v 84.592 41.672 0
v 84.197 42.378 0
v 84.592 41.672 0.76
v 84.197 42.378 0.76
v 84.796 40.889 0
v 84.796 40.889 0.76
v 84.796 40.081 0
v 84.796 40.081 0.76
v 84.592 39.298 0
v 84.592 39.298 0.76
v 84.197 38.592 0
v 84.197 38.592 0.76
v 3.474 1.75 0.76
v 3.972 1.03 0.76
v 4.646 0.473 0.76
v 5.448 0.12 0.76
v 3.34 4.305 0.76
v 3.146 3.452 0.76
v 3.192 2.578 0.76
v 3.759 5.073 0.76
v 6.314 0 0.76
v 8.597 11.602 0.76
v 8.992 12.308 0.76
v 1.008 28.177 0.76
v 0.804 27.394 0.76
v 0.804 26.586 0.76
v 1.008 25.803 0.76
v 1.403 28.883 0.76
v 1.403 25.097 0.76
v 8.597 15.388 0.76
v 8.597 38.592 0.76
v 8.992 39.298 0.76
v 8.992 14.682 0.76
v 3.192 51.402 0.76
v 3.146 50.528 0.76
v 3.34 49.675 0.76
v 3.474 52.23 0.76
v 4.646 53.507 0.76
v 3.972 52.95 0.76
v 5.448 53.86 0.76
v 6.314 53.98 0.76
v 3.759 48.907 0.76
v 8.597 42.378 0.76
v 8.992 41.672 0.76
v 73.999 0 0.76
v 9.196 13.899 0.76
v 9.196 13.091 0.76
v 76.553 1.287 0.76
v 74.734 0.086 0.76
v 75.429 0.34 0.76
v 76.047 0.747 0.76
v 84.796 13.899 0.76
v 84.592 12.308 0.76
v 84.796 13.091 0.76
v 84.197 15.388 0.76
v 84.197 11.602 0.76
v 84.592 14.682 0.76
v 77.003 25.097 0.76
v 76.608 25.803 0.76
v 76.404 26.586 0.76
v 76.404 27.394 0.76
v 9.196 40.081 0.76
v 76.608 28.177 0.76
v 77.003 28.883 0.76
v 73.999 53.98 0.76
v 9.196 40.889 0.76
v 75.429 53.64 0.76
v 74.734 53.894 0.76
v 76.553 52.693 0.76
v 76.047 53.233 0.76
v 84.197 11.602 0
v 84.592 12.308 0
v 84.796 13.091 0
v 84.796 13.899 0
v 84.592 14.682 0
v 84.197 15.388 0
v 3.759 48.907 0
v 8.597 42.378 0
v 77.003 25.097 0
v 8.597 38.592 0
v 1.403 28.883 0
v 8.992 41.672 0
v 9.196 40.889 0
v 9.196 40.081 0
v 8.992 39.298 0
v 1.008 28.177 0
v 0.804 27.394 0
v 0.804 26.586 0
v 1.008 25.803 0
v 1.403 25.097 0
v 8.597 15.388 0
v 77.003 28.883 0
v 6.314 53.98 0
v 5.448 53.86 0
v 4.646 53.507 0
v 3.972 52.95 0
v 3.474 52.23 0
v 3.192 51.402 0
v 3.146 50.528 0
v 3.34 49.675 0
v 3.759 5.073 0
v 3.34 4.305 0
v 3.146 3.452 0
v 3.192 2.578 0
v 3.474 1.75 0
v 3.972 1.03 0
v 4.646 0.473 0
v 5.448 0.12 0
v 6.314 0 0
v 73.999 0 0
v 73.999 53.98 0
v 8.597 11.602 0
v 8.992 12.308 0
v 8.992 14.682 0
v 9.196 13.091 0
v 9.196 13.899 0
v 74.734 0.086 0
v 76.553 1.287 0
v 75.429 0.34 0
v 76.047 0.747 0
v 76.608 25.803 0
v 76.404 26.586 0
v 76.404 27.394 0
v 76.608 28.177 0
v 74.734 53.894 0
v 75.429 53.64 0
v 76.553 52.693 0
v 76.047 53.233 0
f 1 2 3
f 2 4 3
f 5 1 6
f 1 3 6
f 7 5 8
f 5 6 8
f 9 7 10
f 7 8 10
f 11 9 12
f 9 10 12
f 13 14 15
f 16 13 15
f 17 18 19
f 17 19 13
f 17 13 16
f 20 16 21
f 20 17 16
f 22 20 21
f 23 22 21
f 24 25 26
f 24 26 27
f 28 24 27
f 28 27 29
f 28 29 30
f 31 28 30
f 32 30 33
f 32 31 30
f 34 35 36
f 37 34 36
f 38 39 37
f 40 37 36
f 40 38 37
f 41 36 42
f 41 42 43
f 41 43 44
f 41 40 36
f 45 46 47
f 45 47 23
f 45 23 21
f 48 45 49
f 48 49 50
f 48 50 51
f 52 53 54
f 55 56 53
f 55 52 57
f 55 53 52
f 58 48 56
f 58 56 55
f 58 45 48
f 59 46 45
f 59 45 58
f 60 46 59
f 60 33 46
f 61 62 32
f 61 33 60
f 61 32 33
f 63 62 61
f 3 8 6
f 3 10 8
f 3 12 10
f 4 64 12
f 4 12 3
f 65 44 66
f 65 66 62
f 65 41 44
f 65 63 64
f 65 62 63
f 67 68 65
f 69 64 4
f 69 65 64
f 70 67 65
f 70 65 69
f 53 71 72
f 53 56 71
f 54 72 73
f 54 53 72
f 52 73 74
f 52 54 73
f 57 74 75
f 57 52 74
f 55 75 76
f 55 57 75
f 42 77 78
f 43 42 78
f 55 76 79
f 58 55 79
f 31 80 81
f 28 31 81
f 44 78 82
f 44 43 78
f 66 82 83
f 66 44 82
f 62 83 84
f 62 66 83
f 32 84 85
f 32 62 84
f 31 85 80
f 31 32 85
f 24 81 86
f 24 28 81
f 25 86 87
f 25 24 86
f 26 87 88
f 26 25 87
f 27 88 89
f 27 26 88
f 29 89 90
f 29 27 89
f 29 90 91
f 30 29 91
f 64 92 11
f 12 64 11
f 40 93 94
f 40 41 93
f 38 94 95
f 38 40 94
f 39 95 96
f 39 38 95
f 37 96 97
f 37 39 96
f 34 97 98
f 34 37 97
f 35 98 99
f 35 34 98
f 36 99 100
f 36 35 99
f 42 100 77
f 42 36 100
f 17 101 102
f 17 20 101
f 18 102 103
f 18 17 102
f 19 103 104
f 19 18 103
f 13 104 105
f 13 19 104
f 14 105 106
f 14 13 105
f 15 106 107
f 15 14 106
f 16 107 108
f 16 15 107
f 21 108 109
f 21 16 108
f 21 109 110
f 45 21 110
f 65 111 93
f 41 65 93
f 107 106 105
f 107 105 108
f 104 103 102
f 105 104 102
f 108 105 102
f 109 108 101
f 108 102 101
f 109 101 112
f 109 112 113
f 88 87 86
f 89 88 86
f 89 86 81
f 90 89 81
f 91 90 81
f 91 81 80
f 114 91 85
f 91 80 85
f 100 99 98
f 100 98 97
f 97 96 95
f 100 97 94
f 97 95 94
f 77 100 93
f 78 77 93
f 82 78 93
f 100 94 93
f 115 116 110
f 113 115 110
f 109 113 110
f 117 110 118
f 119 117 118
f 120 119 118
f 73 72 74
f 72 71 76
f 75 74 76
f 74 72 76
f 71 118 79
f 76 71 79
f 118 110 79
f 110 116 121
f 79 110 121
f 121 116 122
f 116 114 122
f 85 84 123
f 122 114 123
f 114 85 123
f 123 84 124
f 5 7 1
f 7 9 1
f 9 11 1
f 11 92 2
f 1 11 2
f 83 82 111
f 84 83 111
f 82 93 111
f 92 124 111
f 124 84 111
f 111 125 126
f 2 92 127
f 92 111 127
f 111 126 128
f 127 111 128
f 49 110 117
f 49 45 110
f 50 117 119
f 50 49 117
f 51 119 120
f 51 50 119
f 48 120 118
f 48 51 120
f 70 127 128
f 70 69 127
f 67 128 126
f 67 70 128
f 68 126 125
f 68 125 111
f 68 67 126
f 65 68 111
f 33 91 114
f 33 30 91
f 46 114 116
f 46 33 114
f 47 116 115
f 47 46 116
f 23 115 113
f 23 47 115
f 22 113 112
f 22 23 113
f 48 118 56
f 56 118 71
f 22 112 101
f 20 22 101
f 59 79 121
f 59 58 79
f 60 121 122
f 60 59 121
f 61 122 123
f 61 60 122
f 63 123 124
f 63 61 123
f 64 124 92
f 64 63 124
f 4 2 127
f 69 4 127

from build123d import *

# Parameters (mm, degrees)
F1_DEPTH = 0.76
F2_R     = 3.18


with BuildPart() as f1:
    # F0 (on Top) → F1 (new body)
    with BuildSketch(Plane.XY):
        Polygon((85.6, 40.485), (75.6, 53.98), (0, 53.98), (10, 40.485), (0, 26.99), (10, 13.495), (0, 0), (75.6, 0), (85.6, 13.495), (75.6, 26.99), align=None)
    extrude(amount=F1_DEPTH)

    # F2
    f2_edges = [f1.edges().sort_by_distance(p)[0] for p in [
        (0, 53.98, 0.38),
        (10, 40.485, 0.38),
        (0, 26.99, 0.38),
        (10, 13.495, 0.38),
        (0, 0, 0.38),
        (75.6, 53.98, 0.38),
        (85.6, 40.485, 0.38),
        (75.6, 26.99, 0.38),
        (85.6, 13.495, 0.38),
        (75.6, 0, 0.38),
    ]]
    fillet(f2_edges, radius=F2_R)


solid = f1.part
